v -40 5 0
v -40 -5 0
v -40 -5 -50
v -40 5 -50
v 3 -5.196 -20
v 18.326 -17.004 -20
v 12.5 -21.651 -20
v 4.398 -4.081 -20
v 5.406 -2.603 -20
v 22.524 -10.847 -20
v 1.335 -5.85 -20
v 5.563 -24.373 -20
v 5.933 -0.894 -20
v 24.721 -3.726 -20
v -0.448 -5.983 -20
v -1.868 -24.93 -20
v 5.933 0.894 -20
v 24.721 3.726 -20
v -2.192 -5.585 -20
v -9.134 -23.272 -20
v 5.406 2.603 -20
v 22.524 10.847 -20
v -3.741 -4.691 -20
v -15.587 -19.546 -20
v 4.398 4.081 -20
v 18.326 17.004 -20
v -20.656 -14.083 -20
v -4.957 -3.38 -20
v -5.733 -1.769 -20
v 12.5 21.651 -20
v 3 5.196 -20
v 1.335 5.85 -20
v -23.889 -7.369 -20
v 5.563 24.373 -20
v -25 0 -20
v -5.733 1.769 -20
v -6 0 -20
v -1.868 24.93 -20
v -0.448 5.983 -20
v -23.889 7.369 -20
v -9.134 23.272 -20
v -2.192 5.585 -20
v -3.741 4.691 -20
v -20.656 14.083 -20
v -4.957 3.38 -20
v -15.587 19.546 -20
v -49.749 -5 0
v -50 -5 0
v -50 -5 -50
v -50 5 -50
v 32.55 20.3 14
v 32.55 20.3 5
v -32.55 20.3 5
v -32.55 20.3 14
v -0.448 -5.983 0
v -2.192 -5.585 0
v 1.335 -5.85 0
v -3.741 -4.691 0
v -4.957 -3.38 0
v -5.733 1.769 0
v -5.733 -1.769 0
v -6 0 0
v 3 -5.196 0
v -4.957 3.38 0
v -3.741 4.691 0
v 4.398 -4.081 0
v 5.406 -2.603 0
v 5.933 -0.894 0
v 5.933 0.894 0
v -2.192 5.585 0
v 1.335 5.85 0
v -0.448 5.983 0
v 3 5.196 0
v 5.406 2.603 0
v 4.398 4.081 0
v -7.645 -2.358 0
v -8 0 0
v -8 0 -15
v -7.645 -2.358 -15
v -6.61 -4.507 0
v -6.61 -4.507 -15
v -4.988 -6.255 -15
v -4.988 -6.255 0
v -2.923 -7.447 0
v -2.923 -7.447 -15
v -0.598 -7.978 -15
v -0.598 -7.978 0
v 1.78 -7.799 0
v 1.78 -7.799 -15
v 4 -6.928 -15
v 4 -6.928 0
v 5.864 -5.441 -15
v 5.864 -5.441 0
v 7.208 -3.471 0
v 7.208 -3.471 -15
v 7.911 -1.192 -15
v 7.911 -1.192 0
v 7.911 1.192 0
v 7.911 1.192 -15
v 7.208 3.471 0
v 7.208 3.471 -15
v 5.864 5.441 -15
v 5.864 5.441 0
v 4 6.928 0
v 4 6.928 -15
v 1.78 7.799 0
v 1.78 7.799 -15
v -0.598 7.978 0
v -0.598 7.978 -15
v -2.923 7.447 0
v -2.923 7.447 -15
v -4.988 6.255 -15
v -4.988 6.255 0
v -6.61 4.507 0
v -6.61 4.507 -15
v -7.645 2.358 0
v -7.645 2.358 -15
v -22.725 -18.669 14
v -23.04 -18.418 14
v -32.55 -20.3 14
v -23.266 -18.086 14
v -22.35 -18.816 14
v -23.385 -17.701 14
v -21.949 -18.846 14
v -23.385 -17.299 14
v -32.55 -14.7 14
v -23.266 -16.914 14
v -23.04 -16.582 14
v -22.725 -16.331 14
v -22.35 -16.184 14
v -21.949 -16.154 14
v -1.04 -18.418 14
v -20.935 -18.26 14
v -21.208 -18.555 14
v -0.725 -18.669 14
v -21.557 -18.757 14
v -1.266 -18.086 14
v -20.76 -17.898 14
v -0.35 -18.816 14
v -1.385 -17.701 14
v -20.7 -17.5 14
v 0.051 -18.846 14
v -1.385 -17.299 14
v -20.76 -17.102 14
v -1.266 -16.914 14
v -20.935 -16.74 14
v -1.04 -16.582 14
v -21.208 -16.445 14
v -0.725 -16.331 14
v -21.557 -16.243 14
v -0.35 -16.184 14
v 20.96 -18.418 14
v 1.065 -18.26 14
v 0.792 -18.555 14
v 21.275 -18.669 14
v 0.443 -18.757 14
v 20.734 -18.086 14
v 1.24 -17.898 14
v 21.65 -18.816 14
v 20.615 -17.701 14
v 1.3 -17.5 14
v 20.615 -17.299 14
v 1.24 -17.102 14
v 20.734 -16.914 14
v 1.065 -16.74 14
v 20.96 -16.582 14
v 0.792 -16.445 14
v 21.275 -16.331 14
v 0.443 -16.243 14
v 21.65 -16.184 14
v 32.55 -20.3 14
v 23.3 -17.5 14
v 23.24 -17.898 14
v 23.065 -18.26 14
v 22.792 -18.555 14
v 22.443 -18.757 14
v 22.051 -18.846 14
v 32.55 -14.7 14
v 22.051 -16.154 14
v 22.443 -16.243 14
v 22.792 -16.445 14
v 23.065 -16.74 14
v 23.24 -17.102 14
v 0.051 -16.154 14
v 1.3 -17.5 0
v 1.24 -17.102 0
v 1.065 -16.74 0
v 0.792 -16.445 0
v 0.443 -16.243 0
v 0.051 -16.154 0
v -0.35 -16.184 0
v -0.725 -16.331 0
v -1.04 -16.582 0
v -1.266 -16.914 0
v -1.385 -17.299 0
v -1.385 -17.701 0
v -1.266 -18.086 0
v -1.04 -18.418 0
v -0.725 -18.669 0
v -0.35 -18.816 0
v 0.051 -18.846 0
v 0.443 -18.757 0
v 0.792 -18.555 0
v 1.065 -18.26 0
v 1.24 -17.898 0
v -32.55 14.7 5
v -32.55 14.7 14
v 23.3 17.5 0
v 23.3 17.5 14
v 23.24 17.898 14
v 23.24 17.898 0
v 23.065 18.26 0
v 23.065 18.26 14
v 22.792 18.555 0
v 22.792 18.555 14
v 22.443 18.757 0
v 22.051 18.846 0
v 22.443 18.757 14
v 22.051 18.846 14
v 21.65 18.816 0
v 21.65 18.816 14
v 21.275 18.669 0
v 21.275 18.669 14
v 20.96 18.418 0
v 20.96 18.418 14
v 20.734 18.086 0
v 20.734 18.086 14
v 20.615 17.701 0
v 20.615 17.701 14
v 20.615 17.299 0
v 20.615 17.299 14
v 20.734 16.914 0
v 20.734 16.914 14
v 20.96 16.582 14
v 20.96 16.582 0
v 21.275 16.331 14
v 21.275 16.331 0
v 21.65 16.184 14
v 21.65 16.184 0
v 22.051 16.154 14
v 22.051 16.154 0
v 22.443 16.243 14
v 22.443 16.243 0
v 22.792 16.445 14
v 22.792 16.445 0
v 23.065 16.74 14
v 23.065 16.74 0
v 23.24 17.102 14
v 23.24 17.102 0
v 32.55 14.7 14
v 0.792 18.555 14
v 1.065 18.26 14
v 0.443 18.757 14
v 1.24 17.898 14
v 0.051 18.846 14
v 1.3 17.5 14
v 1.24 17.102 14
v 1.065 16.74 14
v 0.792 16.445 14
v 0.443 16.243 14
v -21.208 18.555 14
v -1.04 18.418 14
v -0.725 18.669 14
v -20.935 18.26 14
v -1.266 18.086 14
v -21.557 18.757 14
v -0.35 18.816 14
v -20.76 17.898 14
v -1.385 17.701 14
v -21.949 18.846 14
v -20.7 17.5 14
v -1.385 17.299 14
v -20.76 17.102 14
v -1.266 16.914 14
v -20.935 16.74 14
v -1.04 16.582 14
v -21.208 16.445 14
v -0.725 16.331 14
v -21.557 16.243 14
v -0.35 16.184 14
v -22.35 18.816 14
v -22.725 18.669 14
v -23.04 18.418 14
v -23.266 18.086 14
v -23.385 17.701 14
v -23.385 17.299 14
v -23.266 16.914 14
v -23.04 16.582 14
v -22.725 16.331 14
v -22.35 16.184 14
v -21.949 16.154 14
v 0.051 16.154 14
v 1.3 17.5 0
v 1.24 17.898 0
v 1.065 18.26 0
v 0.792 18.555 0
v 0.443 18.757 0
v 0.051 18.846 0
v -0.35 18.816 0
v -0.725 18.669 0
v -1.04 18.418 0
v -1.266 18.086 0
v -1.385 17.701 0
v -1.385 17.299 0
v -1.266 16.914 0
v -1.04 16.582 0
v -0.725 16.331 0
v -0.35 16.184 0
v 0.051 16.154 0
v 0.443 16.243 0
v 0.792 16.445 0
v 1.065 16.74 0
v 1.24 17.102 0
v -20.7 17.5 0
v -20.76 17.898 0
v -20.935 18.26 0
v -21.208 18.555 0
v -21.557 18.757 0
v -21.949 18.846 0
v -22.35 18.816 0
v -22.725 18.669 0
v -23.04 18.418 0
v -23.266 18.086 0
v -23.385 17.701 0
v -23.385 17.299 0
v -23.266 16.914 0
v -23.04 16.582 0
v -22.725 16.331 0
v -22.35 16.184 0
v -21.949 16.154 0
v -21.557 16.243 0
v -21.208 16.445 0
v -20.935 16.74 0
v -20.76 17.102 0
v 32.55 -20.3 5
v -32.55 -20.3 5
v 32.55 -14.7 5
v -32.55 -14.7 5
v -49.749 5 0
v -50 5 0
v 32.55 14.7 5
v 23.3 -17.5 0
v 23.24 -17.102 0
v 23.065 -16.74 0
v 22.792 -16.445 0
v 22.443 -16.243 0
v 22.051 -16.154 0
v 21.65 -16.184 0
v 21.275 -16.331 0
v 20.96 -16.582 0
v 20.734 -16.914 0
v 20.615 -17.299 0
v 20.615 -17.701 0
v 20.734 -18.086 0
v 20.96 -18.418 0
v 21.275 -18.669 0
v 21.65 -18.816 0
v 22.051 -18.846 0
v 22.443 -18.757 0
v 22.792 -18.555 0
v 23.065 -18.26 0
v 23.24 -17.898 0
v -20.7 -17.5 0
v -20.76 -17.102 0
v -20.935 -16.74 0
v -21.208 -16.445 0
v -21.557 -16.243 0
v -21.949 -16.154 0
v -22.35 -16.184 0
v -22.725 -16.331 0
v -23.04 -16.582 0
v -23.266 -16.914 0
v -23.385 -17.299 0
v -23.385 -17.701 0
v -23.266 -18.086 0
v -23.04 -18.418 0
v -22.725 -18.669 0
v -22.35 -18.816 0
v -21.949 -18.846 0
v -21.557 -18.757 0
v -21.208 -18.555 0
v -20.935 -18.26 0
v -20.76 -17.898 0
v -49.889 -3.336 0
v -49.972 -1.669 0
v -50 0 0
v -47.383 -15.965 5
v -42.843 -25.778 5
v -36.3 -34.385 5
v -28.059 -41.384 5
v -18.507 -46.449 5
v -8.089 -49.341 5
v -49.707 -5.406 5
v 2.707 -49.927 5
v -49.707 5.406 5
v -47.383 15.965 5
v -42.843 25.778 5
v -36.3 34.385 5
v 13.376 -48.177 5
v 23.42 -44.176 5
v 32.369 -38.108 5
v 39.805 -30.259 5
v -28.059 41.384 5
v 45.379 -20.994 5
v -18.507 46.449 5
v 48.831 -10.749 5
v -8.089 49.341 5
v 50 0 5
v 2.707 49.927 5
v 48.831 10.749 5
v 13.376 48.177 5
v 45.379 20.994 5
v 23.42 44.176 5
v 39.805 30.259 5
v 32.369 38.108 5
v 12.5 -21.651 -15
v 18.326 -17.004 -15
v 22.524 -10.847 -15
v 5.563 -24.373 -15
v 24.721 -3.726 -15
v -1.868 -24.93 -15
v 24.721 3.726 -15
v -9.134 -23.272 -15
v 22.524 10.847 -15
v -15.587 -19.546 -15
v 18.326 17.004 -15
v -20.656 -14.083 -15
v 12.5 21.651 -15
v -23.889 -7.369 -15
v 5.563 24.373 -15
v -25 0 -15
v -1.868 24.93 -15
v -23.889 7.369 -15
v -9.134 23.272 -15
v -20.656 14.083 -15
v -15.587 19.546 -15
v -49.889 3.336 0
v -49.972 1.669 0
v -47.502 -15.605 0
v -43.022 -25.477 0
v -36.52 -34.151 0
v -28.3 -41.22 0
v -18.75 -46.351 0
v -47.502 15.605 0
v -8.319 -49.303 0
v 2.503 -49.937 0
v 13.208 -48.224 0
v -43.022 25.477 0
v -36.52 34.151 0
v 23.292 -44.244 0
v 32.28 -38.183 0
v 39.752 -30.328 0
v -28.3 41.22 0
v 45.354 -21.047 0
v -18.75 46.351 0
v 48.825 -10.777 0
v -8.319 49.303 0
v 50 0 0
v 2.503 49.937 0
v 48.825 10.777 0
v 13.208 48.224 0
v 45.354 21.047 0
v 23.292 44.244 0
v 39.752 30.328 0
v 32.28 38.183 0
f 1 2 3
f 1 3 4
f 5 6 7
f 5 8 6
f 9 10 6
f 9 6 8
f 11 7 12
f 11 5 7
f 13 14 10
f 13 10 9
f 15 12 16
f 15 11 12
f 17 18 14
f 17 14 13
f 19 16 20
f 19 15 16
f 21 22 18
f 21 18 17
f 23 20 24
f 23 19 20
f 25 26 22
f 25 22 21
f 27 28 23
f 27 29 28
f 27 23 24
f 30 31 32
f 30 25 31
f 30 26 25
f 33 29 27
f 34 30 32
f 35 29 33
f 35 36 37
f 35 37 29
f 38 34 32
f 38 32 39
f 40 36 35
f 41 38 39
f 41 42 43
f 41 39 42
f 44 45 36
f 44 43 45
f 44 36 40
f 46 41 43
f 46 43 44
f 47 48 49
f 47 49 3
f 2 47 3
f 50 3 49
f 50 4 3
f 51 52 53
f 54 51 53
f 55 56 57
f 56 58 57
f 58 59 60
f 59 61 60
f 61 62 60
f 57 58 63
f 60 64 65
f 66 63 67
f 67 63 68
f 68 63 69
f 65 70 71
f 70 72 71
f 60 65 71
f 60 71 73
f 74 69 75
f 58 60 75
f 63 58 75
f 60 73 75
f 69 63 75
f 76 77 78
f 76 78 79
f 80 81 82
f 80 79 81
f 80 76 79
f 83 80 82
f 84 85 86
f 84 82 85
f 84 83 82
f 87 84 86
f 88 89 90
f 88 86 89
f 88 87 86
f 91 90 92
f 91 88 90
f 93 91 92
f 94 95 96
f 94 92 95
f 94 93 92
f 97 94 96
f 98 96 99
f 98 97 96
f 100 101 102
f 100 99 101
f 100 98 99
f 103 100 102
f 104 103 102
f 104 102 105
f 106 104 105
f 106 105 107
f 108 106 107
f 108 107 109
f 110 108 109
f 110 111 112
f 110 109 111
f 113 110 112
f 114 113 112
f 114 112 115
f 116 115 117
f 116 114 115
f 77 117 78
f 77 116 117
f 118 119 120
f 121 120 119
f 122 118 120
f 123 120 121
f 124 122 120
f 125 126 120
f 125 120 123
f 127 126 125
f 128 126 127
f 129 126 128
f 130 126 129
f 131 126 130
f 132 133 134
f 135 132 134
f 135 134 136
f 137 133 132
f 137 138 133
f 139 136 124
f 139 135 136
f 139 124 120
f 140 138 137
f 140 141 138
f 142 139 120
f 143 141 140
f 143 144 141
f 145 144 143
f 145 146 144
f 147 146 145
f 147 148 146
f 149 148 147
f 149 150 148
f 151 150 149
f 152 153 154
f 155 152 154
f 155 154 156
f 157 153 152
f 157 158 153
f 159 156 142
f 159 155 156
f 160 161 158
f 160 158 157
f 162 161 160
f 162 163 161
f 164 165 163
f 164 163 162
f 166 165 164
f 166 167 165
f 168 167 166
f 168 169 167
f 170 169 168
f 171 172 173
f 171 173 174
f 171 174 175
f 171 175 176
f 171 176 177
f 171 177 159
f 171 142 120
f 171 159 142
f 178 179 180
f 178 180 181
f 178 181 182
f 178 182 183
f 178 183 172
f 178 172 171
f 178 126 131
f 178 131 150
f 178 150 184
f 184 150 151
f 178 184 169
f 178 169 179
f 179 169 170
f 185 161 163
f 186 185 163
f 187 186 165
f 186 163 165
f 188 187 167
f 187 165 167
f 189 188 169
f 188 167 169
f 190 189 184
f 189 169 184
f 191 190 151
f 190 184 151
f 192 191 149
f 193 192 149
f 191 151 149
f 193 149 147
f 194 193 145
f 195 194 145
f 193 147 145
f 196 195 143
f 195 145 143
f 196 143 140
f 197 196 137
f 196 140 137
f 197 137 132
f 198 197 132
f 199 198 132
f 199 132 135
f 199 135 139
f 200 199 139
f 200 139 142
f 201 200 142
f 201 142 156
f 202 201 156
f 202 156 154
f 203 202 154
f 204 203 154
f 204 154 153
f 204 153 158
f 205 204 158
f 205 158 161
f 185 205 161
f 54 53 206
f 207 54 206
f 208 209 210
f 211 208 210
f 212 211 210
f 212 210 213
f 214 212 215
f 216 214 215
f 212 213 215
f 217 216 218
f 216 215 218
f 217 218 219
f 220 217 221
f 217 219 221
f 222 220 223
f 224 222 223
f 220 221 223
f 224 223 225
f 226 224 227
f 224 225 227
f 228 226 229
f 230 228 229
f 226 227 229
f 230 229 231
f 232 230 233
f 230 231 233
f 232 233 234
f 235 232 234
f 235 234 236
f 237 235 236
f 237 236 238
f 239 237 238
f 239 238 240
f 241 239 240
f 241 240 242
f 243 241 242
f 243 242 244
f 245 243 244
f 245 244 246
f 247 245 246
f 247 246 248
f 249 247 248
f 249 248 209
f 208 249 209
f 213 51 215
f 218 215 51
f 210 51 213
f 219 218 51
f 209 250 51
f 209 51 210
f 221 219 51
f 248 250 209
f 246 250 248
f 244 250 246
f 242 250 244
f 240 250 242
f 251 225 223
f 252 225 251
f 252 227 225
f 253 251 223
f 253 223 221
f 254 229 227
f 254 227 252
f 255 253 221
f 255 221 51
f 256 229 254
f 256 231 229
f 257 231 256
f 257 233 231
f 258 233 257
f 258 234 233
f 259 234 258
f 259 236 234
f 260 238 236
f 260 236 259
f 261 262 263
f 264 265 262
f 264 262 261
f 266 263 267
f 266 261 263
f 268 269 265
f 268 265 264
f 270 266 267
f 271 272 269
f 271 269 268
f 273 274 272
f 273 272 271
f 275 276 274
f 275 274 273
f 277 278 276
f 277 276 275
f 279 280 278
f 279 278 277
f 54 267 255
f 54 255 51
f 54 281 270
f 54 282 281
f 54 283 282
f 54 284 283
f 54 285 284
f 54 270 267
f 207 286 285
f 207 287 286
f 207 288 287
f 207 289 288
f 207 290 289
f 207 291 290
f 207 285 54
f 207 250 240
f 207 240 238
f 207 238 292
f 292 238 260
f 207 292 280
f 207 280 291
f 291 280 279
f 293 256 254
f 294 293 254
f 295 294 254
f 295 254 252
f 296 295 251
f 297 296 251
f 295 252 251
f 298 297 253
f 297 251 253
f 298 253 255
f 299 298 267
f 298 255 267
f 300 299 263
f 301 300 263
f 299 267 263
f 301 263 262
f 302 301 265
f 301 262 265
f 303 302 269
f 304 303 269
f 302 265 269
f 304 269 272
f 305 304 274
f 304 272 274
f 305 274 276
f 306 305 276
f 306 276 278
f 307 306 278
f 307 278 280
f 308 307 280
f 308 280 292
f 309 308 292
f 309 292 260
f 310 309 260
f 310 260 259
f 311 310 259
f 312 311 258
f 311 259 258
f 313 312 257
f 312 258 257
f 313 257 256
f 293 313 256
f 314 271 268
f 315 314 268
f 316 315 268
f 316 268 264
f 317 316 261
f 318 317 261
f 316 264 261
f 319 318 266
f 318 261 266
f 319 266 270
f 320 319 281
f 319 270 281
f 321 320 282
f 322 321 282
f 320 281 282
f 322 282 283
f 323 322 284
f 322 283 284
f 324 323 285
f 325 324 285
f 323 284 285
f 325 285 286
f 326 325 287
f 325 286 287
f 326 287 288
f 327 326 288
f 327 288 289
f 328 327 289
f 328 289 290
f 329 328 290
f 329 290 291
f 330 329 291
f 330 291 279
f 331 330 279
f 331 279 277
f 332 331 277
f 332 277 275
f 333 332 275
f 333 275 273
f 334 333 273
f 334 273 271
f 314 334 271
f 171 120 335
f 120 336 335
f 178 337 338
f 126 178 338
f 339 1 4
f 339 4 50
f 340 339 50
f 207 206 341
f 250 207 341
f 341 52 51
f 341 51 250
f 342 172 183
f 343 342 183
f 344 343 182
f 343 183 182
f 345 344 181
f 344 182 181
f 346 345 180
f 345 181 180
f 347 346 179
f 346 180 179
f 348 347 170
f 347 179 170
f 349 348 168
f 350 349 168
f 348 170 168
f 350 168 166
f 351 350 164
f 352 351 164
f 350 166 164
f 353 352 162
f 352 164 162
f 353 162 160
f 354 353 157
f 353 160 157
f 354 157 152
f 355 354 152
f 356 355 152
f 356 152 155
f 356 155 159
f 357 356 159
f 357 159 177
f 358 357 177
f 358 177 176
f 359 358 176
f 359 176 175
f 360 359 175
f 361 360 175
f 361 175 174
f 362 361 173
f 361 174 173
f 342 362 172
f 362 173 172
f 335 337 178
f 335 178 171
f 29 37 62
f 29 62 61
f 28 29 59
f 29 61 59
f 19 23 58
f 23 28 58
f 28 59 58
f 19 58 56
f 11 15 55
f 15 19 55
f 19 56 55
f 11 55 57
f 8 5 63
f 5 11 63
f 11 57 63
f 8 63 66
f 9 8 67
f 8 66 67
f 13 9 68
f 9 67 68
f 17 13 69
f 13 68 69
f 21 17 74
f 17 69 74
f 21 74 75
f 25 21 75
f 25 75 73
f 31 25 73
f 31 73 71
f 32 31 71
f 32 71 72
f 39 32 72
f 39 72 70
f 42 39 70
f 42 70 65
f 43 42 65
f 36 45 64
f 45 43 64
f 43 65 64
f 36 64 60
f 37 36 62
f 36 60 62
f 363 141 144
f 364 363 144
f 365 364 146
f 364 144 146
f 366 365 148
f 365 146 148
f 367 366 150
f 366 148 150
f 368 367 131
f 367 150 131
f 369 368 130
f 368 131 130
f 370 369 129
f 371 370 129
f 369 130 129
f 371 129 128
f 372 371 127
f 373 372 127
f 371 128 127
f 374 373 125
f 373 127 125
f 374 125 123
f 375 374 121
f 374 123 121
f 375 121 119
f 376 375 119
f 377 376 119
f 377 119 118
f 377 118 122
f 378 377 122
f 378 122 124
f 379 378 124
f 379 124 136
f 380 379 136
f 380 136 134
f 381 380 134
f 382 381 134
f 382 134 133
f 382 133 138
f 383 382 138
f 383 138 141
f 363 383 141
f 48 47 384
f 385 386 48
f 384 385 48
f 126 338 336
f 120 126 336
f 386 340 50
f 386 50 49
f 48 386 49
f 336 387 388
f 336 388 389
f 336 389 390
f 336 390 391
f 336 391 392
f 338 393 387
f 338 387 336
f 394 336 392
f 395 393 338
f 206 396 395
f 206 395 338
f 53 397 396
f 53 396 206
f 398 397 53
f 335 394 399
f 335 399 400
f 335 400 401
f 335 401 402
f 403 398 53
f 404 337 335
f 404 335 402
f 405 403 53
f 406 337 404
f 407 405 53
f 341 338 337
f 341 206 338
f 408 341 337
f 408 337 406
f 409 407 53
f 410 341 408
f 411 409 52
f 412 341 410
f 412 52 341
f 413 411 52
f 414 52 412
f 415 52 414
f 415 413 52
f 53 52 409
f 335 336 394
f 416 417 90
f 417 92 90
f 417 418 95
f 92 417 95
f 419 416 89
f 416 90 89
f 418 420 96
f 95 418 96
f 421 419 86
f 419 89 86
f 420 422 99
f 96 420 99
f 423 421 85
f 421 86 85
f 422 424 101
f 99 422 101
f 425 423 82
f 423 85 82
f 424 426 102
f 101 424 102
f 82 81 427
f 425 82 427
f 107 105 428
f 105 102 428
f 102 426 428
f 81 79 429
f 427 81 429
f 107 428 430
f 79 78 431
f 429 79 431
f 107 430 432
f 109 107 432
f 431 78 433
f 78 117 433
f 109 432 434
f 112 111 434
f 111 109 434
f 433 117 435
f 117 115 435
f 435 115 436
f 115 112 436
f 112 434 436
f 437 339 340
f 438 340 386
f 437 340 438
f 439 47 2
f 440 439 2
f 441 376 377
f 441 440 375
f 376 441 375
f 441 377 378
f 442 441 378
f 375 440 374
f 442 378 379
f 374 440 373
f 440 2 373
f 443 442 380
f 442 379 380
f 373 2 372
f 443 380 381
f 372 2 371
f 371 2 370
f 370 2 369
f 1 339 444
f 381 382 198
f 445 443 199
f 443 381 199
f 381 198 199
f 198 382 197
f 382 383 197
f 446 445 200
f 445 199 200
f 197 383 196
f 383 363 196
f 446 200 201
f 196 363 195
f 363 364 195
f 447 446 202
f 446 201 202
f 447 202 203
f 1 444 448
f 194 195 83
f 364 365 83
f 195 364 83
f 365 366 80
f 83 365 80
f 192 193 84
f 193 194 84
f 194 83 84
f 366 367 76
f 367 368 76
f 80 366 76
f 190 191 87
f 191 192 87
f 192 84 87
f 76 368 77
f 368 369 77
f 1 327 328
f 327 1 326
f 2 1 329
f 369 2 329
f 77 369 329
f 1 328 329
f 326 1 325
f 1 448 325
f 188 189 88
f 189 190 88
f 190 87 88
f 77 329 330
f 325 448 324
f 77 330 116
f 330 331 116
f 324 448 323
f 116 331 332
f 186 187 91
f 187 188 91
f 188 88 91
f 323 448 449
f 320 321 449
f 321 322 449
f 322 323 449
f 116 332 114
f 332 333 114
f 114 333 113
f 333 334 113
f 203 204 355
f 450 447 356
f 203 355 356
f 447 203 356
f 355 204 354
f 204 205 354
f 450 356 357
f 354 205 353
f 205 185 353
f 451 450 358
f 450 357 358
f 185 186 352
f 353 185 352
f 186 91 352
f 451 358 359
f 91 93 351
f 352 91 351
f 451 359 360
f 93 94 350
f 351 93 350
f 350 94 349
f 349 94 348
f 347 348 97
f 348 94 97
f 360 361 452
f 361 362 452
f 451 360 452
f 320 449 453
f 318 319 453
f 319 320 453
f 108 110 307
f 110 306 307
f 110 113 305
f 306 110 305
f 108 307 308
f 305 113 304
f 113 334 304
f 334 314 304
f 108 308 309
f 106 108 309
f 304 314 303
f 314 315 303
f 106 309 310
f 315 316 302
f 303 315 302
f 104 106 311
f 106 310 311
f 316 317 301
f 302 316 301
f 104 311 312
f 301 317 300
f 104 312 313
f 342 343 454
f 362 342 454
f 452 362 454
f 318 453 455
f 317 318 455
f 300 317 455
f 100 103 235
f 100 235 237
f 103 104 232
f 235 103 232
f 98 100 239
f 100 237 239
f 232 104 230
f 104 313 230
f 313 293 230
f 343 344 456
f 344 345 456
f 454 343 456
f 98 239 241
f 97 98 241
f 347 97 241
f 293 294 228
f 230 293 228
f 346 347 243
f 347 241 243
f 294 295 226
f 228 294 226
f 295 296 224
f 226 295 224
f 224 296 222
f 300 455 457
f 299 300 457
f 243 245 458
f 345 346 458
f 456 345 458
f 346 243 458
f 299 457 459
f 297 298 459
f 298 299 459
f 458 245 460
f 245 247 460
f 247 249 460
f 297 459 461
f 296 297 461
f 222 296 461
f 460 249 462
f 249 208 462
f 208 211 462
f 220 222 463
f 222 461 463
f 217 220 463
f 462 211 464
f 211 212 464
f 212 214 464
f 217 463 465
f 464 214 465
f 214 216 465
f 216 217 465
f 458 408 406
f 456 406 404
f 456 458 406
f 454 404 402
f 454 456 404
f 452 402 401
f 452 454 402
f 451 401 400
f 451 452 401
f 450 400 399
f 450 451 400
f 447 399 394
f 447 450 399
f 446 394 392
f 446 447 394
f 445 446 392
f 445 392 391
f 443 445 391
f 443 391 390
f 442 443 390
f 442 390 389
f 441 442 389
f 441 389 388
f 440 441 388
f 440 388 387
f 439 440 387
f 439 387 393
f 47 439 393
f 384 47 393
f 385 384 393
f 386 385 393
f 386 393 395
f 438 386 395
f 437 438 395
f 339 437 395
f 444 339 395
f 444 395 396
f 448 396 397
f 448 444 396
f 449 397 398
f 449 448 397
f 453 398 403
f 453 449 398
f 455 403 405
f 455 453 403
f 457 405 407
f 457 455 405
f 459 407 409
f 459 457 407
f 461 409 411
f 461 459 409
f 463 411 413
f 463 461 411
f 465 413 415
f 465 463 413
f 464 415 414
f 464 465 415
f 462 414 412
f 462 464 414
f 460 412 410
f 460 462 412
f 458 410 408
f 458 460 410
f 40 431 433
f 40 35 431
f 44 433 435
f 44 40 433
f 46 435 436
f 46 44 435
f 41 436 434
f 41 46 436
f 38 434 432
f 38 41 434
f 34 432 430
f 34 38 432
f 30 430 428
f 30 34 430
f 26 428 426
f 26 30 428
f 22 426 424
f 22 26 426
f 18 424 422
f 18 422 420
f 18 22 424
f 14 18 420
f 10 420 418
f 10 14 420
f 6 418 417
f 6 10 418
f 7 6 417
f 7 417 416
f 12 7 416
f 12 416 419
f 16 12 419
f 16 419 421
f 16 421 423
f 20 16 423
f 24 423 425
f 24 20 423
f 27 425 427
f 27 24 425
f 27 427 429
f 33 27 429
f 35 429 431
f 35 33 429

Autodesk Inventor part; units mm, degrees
ref_plane "YZ Plane" through (0, 0, 0) normal (1, 0, 0) x (0, 1, 0)
ref_plane "XZ Plane" through (0, 0, 0) normal (0, 1, 0) x (-1, 0, 0)
ref_plane "XY Plane" through (0, 0, 0) normal (0, 0, 1) x (1, 0, 0)
sketch "Skizze1" plane through (0, 0, 0) normal (0, 0, 1) x (1, 0, 0)
  circle A0 centre (0, 0) radius 50
  dimension "d0" = 100
extrude "Extrusion1" add sketch "Skizze1" along normal blind 5
sketch "Skizze2" plane through (0, 0, 0) normal (0, 0, -1) x (-1, 0, 0)
  circle A0 centre (0, 0) radius 6
  circle A1 centre (0, 0) radius 8
  dimension "d3" = 12
  dimension "d4" = 16
extrude "Extrusion2" add sketch "Skizze2" along normal blind 20
sketch "Skizze3" plane through (0, 0, 0) normal (0, 0, -1) x (-1, 0, 0)
  circle A0 centre (0, 0) radius 50 construction
  line L0 (50, 0) -> (40, 0) construction
  line L1 (40, 0) -> (40, 5) construction
  line L2 (40, 5) -> (50, 5) construction
  line L3 (40, 5) -> (50, 5) construction
  line L4 (50, 5) -> (50, 0) construction
  line L5 (50, 0) -> (50, -5) construction
  line L6 (40, 5) -> (50, 5)
  line L7 (50, 5) -> (50, -5)
  line L8 (50, -5) -> (40, -5)
  line L9 (40, -5) -> (40, 5)
  dimension "d7" = 10
  dimension "d8" = 5
  dimension "d10" = 10
  dimension "d11" = 0
  dimension "d12" = 5
extrude "Extrusion3" add sketch "Skizze3" along normal blind 50
sketch "Skizze4" plane through (0, 0, 5) normal (0, 0, 1) x (1, 0, 0)
  line L0 (-40, 5) -> (-49.7494, 5) construction
  circle A0 centre (0, 0) radius 6 construction
  line L1 (0, 0) -> (32.55, 0) construction
  line L2 (32.55, 0) -> (32.55, -20.3)
  line L3 (0, 0) -> (-32.55, 0) construction
  line L4 (-32.55, 0) -> (-32.55, -20.3) construction
  line L5 (-32.55, 0) -> (-32.55, -20.3) construction
  line L6 (32.55, -20.3) -> (32.55, -14.7) construction
  line L7 (-32.55, -20.3) -> (-32.55, -14.7) construction
  line L8 (-32.55, -20.3) -> (32.55, -20.3)
  line L9 (32.55, -20.3) -> (32.55, -14.7)
  line L10 (32.55, -14.7) -> (-32.55, -14.7)
  line L11 (-32.55, -14.7) -> (-32.55, -20.3)
  dimension "d23" = 32.55
  dimension "d24" = 20.3
  dimension "d25" = 32.55
  dimension "d26" = 20.3
  dimension "d27" = 5.6
  dimension "d28" = 5.6
extrude "Extrusion4" add sketch "Skizze4" along normal blind 9
ref_plane "Arbeitsebene1" through (-32.55, 0, 5) normal (0, 1, 0) x (1, 0, 0)
mirror "Spiegeln1" about plane through (-32.55, 0, 5) normal (0, 1, 0) of "Extrusion4"
sketch "Skizze9" plane through (-32.55, 20.3, 14) normal (0, 0, 1) x (1, 0, 0)
  circle A0 centre (32.5, -2.8) radius 1.35 projected
  circle A1 centre (54.5, -2.8) radius 1.35 projected
  circle A2 centre (10.5, -2.8) radius 1.35 projected
  circle A3 centre (54.5, -2.8) radius 1.4
  circle A4 centre (32.5, -2.8) radius 1.4
  circle A5 centre (10.5, -2.8) radius 1.4
  point P0 (32.55, -20.3)
  dimension "d40" = 2.8
  dimension "d41" = 2.8
  dimension "d42" = 2.8
extrude "Extrusion7" cut sketch "Skizze9" against normal through all contours A0 | A1 | A2
mirror "Spiegeln3" about plane through (-32.55, 0, 5) normal (0, 1, 0) of "Extrusion7"
sketch "Skizze11" plane through (0, 0, -20) normal (0, 0, -1) x (-1, 0, 0)
  circle A0 centre (0, 0) radius 8 projected
  circle A1 centre (0, 0) radius 8
  circle A2 centre (0, 0) radius 25
  dimension "d53" = 16
  dimension "d54" = 50
extrude "Extrusion9" add sketch "Skizze11" against normal blind 5
properties part number "turntable"
